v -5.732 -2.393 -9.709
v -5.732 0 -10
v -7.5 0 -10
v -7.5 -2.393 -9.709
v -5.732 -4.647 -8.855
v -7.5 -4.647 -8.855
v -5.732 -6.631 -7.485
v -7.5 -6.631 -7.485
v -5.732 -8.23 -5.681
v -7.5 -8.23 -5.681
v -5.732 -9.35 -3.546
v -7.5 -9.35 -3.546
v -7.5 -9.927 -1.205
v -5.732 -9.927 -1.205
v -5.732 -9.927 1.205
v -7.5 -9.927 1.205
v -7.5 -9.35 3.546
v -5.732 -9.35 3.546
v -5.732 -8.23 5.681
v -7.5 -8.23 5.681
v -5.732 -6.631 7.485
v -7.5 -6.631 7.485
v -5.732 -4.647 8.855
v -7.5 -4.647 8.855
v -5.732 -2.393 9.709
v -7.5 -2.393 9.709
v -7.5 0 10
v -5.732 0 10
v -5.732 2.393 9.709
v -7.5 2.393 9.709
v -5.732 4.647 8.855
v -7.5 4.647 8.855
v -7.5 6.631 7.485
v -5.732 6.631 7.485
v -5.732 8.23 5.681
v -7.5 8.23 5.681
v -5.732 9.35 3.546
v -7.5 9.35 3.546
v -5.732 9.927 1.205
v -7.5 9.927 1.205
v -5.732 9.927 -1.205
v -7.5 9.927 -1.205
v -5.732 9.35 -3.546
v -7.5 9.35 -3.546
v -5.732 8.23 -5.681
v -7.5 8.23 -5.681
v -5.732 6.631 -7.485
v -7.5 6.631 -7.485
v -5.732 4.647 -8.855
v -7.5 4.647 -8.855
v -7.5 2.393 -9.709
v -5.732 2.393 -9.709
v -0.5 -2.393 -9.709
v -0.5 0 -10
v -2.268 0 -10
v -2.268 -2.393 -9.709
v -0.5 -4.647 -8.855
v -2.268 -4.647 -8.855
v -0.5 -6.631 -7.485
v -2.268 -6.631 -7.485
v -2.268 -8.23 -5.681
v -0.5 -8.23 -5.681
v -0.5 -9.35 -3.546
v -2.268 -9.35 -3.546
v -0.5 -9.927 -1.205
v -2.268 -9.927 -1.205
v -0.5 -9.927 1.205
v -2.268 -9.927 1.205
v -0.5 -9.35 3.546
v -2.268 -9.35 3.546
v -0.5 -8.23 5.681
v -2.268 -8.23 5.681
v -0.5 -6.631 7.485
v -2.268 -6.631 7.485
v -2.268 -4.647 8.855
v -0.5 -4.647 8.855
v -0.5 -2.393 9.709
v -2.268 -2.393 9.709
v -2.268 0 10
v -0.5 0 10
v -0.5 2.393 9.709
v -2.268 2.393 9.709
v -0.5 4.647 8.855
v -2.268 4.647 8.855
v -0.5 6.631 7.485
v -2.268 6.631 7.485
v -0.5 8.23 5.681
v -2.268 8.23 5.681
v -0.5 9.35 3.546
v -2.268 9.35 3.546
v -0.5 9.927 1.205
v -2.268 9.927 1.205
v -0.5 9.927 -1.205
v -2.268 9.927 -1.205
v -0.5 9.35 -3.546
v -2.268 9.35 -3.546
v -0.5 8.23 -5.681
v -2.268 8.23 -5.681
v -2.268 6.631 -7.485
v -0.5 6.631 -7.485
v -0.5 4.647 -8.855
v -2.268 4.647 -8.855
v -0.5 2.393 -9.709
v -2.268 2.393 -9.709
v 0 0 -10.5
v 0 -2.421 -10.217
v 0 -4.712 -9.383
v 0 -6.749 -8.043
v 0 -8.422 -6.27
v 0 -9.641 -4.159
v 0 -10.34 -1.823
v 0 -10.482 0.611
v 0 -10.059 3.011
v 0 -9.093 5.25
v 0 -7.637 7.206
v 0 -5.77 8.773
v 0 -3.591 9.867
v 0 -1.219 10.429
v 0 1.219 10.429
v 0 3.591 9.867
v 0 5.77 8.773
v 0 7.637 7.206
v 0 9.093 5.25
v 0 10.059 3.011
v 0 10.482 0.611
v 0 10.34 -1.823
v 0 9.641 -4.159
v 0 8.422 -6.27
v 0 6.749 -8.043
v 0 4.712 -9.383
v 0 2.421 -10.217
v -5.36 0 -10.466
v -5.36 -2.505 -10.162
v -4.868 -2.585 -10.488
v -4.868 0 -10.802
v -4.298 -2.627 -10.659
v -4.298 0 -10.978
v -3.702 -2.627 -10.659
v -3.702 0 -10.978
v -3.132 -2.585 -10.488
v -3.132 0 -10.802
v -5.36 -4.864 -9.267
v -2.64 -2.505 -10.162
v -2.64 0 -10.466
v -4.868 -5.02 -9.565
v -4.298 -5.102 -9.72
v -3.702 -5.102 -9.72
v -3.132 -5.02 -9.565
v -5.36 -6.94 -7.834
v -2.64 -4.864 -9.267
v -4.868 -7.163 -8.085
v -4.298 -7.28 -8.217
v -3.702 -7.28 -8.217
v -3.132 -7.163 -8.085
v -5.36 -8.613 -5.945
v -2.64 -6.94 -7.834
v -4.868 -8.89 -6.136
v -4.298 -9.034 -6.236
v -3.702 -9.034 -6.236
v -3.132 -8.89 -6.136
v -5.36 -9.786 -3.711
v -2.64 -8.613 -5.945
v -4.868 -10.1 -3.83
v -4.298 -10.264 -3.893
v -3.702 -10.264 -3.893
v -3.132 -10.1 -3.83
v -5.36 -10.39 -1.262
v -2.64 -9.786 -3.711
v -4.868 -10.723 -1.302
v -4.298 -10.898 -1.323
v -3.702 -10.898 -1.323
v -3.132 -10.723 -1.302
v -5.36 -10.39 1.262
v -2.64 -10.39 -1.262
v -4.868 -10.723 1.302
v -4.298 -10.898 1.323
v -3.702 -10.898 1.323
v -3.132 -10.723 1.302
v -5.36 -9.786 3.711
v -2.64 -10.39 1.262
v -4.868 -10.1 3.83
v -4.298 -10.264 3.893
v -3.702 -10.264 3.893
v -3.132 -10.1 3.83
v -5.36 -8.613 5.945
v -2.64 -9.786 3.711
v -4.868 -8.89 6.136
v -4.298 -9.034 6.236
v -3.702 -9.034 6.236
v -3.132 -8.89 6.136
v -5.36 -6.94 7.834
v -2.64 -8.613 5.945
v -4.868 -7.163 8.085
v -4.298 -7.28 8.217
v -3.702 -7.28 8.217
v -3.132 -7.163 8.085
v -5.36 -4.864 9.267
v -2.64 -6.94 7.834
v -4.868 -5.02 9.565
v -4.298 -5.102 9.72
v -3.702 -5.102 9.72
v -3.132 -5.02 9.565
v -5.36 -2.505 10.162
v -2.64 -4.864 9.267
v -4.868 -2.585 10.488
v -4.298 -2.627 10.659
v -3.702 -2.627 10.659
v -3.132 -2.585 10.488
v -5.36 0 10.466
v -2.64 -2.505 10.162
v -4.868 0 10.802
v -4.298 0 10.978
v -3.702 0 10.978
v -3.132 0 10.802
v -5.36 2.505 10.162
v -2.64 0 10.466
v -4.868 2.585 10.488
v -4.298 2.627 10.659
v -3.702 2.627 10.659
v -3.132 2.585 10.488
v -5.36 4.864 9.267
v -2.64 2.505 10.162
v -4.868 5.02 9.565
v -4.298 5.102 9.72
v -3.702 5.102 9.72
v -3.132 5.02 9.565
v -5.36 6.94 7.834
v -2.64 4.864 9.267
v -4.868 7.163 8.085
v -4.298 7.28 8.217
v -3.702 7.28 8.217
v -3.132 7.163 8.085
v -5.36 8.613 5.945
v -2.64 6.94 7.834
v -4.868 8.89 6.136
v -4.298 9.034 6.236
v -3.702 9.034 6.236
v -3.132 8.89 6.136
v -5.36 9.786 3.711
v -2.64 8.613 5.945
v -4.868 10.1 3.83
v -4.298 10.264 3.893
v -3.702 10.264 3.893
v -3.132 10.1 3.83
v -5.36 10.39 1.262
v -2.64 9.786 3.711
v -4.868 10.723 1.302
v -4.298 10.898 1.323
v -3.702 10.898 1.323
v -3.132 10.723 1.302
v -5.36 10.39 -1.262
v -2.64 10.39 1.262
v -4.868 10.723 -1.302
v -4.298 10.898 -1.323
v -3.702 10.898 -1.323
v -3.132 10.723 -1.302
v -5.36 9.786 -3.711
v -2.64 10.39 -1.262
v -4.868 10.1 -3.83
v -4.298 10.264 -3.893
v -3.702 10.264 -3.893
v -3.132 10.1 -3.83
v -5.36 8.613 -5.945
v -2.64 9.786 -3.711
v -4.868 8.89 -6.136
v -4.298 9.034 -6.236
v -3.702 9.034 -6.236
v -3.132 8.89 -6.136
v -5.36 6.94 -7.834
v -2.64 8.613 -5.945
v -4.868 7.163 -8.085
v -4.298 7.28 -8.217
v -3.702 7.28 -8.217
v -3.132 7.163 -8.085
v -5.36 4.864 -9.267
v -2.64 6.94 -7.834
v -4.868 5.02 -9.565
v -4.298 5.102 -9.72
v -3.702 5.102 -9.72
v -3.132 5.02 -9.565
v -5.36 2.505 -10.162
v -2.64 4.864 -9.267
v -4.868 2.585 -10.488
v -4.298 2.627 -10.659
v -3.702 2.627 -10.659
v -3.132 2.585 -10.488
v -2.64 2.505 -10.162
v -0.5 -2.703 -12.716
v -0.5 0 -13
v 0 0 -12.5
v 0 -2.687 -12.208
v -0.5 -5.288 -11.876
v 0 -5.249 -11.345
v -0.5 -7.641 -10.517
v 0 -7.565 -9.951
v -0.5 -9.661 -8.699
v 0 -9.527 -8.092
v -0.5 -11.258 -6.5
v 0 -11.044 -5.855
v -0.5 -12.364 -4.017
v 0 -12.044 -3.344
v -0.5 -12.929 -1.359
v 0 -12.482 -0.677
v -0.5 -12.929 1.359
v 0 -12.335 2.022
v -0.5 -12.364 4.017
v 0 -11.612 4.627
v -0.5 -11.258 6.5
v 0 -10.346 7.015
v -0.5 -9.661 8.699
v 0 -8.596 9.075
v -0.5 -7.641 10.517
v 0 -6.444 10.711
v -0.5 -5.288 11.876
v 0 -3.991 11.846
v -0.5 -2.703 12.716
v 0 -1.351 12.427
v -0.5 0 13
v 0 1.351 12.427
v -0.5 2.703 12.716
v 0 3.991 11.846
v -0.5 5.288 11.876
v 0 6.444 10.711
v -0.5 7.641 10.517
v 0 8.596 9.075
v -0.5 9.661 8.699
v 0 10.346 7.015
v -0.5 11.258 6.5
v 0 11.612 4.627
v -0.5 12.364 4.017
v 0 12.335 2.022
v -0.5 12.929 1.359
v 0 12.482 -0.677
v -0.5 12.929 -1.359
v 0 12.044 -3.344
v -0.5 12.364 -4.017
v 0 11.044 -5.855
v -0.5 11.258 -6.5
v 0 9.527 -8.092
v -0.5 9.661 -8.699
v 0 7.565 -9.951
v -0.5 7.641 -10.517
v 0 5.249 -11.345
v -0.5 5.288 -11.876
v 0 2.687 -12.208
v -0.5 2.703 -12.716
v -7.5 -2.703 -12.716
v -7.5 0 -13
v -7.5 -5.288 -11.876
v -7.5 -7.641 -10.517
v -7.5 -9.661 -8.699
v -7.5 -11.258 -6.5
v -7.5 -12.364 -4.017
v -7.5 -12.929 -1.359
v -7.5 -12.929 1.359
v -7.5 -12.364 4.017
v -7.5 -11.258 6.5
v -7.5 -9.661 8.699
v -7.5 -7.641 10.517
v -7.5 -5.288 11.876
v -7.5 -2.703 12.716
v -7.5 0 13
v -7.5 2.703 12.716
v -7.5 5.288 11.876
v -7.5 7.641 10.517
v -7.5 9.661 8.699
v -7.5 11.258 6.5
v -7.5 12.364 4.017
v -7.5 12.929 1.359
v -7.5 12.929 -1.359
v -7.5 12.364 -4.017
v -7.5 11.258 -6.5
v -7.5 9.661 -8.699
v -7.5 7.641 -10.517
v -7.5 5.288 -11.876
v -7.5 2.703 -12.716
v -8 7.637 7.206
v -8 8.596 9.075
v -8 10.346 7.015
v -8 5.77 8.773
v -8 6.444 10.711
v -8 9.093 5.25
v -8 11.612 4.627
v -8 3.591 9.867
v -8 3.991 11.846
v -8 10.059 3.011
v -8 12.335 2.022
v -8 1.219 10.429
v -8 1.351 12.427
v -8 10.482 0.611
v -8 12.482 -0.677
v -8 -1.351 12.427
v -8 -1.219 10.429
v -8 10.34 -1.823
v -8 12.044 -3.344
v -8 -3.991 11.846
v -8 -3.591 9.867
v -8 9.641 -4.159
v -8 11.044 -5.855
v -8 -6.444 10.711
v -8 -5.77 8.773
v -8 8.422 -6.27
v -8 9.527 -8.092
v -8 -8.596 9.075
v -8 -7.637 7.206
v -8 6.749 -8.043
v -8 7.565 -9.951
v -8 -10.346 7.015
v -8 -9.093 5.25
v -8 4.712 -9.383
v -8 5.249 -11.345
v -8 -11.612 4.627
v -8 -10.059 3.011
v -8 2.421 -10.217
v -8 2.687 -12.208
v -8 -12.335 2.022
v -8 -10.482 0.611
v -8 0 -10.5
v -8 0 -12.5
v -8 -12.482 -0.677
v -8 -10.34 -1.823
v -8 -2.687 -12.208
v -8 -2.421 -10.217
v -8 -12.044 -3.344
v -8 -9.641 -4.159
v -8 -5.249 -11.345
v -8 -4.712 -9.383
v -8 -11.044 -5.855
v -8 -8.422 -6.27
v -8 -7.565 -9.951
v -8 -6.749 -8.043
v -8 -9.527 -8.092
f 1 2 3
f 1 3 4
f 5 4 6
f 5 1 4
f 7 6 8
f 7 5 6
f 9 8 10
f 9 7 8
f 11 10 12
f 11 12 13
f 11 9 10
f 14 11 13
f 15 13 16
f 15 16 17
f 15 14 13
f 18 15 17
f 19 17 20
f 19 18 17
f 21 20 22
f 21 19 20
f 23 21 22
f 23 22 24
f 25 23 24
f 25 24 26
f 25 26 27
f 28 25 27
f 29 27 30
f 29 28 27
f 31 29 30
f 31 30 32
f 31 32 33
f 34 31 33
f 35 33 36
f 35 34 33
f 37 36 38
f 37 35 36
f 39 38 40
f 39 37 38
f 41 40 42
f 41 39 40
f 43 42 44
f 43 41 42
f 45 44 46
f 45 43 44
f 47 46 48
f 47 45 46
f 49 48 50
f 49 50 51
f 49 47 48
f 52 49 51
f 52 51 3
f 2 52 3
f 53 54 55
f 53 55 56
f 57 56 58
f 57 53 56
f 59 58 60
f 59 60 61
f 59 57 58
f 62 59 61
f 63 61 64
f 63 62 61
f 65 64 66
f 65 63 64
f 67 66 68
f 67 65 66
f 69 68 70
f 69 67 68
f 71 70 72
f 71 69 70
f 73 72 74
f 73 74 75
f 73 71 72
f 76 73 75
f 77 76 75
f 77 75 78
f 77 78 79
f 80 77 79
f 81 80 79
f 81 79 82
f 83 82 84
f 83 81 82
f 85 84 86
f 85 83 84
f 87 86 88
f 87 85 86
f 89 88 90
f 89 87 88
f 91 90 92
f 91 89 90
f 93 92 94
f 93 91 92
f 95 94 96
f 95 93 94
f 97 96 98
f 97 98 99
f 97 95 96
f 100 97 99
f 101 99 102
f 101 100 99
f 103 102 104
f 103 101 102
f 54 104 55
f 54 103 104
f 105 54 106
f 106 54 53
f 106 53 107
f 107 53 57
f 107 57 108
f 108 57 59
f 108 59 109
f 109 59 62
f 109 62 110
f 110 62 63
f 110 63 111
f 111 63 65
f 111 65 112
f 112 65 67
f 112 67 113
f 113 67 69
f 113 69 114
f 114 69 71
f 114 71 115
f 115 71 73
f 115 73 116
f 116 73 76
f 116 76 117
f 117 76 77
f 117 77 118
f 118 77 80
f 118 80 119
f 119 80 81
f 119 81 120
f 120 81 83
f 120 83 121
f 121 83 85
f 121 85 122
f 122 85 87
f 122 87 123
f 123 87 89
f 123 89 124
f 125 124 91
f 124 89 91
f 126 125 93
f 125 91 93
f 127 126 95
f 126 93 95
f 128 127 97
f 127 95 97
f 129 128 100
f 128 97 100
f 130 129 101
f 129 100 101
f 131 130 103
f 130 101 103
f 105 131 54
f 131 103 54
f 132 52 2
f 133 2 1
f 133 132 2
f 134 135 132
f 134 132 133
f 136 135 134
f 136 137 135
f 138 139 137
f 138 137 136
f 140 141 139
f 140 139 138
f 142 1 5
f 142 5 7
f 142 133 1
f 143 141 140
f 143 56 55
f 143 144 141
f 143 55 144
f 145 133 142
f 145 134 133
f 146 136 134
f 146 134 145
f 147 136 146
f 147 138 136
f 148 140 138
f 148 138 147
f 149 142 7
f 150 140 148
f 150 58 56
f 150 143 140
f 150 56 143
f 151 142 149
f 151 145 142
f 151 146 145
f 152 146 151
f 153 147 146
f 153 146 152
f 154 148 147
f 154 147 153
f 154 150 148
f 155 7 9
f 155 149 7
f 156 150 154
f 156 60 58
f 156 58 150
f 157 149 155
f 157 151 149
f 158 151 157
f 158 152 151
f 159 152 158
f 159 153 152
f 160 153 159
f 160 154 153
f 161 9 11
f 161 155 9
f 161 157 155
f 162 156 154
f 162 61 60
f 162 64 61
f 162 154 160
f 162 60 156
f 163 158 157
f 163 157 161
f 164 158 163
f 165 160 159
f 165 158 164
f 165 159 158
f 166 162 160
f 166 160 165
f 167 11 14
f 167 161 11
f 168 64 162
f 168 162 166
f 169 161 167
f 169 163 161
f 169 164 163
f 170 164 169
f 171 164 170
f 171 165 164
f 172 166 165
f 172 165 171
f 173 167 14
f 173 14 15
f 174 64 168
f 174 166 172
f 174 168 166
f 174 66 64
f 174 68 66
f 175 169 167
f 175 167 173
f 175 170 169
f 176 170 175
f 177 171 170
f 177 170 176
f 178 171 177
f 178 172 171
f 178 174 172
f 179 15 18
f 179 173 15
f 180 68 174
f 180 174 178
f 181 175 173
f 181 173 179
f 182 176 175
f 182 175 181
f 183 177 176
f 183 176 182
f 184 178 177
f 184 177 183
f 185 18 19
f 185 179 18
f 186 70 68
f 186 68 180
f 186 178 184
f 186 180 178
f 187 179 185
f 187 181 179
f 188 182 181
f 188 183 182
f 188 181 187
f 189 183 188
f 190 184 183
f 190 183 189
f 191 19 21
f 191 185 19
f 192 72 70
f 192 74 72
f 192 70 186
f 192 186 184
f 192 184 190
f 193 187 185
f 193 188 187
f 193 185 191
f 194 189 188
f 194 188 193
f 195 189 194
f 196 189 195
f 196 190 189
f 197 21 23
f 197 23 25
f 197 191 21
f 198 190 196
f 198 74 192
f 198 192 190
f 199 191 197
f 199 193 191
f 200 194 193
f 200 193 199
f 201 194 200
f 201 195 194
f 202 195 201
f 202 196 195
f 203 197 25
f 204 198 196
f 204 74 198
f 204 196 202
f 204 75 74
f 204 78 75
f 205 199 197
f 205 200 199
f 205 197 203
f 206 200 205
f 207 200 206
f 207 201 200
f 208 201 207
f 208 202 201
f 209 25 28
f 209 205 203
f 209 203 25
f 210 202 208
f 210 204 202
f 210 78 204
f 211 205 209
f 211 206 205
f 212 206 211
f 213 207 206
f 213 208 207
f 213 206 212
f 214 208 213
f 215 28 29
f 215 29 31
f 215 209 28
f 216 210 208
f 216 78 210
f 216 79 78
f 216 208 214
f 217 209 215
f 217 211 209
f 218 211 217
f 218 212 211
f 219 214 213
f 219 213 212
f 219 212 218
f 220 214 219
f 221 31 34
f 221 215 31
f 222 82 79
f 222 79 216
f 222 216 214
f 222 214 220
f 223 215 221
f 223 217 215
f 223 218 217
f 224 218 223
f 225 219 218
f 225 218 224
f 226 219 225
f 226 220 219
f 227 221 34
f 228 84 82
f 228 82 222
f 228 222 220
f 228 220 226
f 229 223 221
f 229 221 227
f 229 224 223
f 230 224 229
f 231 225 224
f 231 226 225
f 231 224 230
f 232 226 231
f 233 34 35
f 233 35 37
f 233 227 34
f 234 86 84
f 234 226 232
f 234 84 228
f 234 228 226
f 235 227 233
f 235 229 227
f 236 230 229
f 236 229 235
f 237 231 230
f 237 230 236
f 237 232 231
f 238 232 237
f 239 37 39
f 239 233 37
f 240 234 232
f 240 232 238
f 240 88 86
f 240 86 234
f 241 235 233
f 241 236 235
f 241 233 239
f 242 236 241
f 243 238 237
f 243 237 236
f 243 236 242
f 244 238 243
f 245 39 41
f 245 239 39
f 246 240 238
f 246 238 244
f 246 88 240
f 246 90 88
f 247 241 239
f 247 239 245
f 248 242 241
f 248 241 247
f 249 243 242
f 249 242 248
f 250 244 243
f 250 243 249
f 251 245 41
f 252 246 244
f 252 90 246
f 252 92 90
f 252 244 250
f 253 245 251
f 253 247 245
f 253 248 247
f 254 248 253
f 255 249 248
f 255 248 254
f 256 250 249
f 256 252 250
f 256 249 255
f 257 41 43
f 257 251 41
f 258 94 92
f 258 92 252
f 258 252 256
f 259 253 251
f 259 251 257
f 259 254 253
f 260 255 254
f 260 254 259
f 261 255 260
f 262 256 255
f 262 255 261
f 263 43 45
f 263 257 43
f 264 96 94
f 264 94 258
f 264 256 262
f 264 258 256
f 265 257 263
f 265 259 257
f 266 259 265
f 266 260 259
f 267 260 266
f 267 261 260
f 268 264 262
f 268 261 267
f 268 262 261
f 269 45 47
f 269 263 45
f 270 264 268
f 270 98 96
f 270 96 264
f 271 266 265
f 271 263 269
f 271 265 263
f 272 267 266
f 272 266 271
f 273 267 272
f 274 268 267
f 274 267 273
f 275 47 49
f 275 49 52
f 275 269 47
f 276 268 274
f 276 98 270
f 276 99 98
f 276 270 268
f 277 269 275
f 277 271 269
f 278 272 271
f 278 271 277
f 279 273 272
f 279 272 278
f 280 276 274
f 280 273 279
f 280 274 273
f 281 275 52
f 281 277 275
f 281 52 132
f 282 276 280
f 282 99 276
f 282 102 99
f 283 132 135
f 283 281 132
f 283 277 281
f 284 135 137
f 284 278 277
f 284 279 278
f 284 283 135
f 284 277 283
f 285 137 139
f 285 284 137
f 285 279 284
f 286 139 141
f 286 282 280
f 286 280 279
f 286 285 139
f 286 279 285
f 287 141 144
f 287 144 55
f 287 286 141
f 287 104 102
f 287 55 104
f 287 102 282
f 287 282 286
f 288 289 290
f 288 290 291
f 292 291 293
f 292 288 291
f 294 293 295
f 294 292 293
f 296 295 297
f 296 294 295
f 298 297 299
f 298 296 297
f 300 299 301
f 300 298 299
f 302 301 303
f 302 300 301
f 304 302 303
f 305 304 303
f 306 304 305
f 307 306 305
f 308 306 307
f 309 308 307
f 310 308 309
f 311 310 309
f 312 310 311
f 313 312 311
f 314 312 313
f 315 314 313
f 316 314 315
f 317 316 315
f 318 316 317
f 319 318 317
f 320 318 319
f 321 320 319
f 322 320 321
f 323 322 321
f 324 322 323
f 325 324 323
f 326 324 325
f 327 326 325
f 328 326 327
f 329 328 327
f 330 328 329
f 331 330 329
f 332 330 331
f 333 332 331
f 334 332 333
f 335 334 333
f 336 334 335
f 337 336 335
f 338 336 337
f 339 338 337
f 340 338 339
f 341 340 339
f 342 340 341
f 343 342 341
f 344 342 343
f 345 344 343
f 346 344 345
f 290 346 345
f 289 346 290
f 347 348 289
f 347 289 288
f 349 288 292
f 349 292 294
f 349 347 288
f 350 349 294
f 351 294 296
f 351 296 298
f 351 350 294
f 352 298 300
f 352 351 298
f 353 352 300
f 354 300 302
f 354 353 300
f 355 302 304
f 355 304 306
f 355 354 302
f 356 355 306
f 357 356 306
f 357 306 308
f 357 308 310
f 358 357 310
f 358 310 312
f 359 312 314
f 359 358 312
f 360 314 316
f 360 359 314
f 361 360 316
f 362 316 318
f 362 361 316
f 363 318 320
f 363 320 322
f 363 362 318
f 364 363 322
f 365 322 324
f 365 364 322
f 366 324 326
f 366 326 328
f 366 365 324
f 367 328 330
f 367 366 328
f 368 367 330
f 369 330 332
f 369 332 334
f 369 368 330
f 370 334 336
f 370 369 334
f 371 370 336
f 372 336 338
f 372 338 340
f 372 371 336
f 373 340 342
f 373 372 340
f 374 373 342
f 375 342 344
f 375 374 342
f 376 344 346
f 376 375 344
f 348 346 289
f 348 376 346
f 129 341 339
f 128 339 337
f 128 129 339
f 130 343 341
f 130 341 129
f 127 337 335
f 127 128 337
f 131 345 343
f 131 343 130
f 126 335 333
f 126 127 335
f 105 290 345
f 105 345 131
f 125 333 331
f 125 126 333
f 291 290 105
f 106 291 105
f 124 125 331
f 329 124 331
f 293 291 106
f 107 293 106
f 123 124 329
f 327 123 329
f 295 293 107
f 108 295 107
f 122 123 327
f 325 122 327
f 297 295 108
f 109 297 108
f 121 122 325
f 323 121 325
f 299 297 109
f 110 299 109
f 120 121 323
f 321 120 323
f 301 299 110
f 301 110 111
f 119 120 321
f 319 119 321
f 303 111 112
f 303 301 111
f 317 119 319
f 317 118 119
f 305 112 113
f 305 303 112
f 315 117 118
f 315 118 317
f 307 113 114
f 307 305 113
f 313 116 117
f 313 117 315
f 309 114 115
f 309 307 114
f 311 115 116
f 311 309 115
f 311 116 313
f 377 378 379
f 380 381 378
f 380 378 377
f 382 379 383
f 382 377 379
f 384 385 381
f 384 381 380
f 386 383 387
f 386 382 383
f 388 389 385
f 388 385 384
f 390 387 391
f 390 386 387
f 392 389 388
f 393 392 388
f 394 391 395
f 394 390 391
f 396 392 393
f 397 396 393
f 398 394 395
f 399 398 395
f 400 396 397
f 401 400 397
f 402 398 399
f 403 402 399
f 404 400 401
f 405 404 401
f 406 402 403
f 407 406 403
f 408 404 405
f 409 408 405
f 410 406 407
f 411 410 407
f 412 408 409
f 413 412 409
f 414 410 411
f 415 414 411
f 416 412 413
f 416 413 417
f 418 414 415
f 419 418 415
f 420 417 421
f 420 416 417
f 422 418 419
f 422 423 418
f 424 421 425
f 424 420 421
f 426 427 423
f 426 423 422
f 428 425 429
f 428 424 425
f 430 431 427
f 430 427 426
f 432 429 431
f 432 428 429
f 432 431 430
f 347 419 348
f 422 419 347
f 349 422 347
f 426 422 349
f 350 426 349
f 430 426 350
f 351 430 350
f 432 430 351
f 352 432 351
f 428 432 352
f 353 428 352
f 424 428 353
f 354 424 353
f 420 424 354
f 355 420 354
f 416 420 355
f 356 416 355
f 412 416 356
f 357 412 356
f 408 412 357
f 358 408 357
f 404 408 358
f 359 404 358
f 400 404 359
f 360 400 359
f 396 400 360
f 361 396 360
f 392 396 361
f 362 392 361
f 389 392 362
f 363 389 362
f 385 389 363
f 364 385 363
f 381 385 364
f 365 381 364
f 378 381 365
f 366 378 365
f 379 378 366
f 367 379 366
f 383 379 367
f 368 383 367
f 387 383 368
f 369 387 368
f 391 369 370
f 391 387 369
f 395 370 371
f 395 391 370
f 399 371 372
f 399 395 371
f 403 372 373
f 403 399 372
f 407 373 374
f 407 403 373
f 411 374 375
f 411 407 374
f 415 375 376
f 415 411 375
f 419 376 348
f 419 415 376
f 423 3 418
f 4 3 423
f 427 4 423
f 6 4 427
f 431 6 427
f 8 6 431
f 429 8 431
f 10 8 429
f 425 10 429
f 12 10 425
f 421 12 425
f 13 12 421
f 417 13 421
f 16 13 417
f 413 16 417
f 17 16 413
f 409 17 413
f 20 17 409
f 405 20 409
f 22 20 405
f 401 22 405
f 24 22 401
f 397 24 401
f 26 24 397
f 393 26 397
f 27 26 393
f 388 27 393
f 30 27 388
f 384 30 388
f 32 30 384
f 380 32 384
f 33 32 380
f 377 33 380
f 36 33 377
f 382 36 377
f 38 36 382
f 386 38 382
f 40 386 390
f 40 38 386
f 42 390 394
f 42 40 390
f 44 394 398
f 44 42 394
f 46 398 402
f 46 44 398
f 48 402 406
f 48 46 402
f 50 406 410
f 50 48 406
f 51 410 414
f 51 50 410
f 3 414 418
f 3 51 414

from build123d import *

# Parameters (mm, degrees)
PAH1_SIZE = 0.5


with BuildPart() as part:
    # Çizim1 → Döndür1 (revolve)
    with BuildSketch(Plane.XY, mode=Mode.PRIVATE) as d_nd_r1_sk:
        with BuildLine():
            Line((0, 10), (0, 13))
            Line((0, 13), (-8, 13))
            Line((-8, 13), (-8, 10))
            Line((-8, 10), (-5.732050808, 10))
            ThreePointArc((-5.732050808, 10), (-4, 11), (-2.267949192, 10))
            Line((-2.267949192, 10), (0, 10))
        make_face()
    revolve(d_nd_r1_sk.sketch.rotate(Axis((0, 0, 0), (-1, 0, 0)), 90), axis=Axis((0, 0, 0), (-1, 0, 0)))

    # Pah1
    pah1_edges = [part.edges().sort_by_distance(p)[0] for p in [
        (0, 0, 10),
        (0, 0, 13),
        (-8, 0, 13),
        (-8, 0, 10),
    ]]
    chamfer(pah1_edges, length=PAH1_SIZE)


solid = part.part
